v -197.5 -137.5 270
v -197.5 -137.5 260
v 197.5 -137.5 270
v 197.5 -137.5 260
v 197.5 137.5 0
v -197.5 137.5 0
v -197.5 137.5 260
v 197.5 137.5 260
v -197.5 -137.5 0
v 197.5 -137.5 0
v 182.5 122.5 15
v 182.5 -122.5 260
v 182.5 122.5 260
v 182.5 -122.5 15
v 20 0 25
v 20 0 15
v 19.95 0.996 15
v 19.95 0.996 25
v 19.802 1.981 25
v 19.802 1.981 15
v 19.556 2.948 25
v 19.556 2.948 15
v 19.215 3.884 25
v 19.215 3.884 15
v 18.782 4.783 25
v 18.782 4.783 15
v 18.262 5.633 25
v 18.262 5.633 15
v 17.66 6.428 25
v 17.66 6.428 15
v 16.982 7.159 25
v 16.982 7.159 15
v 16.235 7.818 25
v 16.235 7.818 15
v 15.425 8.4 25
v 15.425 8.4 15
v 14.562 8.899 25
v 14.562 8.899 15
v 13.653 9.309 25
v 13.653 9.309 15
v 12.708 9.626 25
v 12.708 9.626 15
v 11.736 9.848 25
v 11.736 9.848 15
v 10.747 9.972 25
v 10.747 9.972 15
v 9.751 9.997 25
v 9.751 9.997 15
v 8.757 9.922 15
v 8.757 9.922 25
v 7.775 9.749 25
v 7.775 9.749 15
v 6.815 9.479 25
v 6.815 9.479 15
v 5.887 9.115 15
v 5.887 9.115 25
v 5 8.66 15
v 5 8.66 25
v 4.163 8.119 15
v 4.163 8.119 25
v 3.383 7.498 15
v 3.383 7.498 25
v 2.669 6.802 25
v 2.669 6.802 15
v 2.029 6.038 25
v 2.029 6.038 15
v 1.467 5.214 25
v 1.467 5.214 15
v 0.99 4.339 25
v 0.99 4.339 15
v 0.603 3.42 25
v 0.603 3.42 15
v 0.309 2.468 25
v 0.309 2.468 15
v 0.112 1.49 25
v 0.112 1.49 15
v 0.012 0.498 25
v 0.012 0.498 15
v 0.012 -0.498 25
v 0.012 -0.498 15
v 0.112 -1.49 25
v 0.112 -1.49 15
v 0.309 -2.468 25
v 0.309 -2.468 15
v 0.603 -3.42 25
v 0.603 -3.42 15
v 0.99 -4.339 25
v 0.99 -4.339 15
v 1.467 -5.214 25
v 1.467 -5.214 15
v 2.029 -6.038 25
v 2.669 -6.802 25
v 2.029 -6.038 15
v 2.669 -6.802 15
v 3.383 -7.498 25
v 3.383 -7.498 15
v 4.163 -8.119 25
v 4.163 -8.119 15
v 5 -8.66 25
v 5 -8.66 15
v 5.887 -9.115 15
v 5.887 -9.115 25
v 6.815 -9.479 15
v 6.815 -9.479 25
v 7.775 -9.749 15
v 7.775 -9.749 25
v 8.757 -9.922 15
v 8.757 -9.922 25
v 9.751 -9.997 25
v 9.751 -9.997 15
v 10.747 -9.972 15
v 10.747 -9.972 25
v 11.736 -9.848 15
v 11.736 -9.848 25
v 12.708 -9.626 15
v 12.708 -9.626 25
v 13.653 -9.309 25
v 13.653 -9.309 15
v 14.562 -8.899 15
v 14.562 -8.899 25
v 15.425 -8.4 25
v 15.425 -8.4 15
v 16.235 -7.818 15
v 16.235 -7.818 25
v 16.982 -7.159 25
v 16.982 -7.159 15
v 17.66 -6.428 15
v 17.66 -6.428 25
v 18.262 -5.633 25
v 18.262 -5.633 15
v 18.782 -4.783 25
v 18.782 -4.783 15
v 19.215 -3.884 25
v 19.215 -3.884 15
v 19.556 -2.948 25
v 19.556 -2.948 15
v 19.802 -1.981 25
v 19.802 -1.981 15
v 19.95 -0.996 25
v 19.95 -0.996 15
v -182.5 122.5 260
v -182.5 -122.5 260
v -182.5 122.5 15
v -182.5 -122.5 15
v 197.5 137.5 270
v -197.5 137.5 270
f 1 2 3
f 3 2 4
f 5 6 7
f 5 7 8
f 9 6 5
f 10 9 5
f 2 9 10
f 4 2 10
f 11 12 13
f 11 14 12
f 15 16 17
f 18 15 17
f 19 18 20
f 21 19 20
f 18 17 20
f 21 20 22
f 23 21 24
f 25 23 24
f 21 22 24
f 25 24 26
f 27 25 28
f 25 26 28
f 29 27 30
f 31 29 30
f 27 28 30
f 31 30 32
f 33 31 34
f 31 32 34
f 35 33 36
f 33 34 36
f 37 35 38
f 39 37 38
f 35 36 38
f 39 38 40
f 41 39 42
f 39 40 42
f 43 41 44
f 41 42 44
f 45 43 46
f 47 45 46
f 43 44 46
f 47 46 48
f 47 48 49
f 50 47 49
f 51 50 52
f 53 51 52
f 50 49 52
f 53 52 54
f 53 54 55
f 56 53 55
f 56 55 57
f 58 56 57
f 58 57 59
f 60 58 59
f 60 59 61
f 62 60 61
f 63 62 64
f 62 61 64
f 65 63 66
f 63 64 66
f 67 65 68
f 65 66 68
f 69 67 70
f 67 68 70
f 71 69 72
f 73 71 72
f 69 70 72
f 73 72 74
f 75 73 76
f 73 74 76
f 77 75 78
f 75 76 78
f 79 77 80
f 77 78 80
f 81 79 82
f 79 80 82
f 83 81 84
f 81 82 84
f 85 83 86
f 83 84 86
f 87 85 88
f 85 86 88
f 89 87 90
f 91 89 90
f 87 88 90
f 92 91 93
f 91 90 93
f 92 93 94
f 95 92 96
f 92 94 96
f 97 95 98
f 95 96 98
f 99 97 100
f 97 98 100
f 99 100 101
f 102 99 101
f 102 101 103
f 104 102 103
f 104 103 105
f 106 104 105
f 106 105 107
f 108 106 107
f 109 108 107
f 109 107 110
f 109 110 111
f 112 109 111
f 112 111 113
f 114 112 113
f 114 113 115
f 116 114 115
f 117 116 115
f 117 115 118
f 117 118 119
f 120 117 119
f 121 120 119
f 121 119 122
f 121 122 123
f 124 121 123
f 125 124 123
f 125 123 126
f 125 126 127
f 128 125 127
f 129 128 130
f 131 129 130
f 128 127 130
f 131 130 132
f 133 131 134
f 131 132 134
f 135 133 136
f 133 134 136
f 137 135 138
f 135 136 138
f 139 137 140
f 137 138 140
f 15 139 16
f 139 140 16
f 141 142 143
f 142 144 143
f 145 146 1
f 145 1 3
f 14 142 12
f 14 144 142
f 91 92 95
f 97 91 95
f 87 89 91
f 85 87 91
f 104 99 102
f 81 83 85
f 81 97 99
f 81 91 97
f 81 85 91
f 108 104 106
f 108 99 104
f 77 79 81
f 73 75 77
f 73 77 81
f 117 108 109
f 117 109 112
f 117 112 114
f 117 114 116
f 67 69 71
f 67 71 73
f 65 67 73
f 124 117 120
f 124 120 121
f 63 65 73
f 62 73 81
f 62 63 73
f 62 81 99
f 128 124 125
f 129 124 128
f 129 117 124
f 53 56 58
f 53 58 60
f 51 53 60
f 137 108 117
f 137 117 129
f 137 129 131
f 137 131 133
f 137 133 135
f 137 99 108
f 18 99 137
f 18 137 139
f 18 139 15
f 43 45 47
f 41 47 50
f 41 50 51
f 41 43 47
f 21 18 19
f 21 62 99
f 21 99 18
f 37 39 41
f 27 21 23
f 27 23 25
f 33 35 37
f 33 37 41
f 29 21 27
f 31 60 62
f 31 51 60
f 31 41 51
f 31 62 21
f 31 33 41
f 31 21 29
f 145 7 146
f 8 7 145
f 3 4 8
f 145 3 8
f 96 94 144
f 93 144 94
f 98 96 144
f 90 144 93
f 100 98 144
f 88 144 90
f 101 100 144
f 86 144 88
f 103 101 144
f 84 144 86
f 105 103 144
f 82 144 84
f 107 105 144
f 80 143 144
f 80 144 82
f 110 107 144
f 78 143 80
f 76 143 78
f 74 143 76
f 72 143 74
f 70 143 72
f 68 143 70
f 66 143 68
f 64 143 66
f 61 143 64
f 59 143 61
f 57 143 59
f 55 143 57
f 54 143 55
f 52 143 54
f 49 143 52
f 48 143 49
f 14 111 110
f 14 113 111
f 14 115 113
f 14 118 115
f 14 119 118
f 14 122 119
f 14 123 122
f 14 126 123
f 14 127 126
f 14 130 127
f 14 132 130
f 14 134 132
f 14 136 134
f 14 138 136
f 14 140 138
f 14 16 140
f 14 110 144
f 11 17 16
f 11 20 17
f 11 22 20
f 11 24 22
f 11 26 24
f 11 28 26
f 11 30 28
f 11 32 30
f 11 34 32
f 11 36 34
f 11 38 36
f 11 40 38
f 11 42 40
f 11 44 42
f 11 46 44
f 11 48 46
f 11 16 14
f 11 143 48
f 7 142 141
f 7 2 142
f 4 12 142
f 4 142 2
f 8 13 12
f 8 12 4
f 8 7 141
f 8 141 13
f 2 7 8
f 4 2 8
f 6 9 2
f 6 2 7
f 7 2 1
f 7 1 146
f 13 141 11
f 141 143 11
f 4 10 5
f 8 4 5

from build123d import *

# Parameters (mm, degrees)
F0_W     = 395
F0_H     = 275
F1_DEPTH = 260
F2_T     = -15
F3_W     = 395
F3_H     = 275
F3_W_2   = 365
F3_H_2   = 245
F4_DEPTH = 10
F5_R     = 10
F6_DEPTH = 10


with BuildPart() as f1:
    # F0 (on Top) → F1 (new body)
    with BuildSketch(Plane.XY):
        Rectangle(F0_W, F0_H)
    extrude(amount=F1_DEPTH)

    # F2
    f2_openings = [f1.faces().sort_by_distance(p)[0] for p in [
        (0, 0, 260),
    ]]
    offset(amount=F2_T, openings=f2_openings)

    # F5 (on face) → F6 (join)
    with BuildSketch(Plane.XY.offset(15)):
        with Locations((10, 0)):
            Circle(F5_R)
    extrude(amount=F6_DEPTH)


with BuildPart() as f4:
    # F3 (on face) → F4 (new body)
    with BuildSketch(Plane.XY.offset(260)):
        Rectangle(F3_W, F3_H)
        Rectangle(F3_W_2, F3_H_2, mode=Mode.SUBTRACT)
        Rectangle(F3_W_2, F3_H_2)
    extrude(amount=F4_DEPTH)


solid = Compound([f1.part, f4.part])
